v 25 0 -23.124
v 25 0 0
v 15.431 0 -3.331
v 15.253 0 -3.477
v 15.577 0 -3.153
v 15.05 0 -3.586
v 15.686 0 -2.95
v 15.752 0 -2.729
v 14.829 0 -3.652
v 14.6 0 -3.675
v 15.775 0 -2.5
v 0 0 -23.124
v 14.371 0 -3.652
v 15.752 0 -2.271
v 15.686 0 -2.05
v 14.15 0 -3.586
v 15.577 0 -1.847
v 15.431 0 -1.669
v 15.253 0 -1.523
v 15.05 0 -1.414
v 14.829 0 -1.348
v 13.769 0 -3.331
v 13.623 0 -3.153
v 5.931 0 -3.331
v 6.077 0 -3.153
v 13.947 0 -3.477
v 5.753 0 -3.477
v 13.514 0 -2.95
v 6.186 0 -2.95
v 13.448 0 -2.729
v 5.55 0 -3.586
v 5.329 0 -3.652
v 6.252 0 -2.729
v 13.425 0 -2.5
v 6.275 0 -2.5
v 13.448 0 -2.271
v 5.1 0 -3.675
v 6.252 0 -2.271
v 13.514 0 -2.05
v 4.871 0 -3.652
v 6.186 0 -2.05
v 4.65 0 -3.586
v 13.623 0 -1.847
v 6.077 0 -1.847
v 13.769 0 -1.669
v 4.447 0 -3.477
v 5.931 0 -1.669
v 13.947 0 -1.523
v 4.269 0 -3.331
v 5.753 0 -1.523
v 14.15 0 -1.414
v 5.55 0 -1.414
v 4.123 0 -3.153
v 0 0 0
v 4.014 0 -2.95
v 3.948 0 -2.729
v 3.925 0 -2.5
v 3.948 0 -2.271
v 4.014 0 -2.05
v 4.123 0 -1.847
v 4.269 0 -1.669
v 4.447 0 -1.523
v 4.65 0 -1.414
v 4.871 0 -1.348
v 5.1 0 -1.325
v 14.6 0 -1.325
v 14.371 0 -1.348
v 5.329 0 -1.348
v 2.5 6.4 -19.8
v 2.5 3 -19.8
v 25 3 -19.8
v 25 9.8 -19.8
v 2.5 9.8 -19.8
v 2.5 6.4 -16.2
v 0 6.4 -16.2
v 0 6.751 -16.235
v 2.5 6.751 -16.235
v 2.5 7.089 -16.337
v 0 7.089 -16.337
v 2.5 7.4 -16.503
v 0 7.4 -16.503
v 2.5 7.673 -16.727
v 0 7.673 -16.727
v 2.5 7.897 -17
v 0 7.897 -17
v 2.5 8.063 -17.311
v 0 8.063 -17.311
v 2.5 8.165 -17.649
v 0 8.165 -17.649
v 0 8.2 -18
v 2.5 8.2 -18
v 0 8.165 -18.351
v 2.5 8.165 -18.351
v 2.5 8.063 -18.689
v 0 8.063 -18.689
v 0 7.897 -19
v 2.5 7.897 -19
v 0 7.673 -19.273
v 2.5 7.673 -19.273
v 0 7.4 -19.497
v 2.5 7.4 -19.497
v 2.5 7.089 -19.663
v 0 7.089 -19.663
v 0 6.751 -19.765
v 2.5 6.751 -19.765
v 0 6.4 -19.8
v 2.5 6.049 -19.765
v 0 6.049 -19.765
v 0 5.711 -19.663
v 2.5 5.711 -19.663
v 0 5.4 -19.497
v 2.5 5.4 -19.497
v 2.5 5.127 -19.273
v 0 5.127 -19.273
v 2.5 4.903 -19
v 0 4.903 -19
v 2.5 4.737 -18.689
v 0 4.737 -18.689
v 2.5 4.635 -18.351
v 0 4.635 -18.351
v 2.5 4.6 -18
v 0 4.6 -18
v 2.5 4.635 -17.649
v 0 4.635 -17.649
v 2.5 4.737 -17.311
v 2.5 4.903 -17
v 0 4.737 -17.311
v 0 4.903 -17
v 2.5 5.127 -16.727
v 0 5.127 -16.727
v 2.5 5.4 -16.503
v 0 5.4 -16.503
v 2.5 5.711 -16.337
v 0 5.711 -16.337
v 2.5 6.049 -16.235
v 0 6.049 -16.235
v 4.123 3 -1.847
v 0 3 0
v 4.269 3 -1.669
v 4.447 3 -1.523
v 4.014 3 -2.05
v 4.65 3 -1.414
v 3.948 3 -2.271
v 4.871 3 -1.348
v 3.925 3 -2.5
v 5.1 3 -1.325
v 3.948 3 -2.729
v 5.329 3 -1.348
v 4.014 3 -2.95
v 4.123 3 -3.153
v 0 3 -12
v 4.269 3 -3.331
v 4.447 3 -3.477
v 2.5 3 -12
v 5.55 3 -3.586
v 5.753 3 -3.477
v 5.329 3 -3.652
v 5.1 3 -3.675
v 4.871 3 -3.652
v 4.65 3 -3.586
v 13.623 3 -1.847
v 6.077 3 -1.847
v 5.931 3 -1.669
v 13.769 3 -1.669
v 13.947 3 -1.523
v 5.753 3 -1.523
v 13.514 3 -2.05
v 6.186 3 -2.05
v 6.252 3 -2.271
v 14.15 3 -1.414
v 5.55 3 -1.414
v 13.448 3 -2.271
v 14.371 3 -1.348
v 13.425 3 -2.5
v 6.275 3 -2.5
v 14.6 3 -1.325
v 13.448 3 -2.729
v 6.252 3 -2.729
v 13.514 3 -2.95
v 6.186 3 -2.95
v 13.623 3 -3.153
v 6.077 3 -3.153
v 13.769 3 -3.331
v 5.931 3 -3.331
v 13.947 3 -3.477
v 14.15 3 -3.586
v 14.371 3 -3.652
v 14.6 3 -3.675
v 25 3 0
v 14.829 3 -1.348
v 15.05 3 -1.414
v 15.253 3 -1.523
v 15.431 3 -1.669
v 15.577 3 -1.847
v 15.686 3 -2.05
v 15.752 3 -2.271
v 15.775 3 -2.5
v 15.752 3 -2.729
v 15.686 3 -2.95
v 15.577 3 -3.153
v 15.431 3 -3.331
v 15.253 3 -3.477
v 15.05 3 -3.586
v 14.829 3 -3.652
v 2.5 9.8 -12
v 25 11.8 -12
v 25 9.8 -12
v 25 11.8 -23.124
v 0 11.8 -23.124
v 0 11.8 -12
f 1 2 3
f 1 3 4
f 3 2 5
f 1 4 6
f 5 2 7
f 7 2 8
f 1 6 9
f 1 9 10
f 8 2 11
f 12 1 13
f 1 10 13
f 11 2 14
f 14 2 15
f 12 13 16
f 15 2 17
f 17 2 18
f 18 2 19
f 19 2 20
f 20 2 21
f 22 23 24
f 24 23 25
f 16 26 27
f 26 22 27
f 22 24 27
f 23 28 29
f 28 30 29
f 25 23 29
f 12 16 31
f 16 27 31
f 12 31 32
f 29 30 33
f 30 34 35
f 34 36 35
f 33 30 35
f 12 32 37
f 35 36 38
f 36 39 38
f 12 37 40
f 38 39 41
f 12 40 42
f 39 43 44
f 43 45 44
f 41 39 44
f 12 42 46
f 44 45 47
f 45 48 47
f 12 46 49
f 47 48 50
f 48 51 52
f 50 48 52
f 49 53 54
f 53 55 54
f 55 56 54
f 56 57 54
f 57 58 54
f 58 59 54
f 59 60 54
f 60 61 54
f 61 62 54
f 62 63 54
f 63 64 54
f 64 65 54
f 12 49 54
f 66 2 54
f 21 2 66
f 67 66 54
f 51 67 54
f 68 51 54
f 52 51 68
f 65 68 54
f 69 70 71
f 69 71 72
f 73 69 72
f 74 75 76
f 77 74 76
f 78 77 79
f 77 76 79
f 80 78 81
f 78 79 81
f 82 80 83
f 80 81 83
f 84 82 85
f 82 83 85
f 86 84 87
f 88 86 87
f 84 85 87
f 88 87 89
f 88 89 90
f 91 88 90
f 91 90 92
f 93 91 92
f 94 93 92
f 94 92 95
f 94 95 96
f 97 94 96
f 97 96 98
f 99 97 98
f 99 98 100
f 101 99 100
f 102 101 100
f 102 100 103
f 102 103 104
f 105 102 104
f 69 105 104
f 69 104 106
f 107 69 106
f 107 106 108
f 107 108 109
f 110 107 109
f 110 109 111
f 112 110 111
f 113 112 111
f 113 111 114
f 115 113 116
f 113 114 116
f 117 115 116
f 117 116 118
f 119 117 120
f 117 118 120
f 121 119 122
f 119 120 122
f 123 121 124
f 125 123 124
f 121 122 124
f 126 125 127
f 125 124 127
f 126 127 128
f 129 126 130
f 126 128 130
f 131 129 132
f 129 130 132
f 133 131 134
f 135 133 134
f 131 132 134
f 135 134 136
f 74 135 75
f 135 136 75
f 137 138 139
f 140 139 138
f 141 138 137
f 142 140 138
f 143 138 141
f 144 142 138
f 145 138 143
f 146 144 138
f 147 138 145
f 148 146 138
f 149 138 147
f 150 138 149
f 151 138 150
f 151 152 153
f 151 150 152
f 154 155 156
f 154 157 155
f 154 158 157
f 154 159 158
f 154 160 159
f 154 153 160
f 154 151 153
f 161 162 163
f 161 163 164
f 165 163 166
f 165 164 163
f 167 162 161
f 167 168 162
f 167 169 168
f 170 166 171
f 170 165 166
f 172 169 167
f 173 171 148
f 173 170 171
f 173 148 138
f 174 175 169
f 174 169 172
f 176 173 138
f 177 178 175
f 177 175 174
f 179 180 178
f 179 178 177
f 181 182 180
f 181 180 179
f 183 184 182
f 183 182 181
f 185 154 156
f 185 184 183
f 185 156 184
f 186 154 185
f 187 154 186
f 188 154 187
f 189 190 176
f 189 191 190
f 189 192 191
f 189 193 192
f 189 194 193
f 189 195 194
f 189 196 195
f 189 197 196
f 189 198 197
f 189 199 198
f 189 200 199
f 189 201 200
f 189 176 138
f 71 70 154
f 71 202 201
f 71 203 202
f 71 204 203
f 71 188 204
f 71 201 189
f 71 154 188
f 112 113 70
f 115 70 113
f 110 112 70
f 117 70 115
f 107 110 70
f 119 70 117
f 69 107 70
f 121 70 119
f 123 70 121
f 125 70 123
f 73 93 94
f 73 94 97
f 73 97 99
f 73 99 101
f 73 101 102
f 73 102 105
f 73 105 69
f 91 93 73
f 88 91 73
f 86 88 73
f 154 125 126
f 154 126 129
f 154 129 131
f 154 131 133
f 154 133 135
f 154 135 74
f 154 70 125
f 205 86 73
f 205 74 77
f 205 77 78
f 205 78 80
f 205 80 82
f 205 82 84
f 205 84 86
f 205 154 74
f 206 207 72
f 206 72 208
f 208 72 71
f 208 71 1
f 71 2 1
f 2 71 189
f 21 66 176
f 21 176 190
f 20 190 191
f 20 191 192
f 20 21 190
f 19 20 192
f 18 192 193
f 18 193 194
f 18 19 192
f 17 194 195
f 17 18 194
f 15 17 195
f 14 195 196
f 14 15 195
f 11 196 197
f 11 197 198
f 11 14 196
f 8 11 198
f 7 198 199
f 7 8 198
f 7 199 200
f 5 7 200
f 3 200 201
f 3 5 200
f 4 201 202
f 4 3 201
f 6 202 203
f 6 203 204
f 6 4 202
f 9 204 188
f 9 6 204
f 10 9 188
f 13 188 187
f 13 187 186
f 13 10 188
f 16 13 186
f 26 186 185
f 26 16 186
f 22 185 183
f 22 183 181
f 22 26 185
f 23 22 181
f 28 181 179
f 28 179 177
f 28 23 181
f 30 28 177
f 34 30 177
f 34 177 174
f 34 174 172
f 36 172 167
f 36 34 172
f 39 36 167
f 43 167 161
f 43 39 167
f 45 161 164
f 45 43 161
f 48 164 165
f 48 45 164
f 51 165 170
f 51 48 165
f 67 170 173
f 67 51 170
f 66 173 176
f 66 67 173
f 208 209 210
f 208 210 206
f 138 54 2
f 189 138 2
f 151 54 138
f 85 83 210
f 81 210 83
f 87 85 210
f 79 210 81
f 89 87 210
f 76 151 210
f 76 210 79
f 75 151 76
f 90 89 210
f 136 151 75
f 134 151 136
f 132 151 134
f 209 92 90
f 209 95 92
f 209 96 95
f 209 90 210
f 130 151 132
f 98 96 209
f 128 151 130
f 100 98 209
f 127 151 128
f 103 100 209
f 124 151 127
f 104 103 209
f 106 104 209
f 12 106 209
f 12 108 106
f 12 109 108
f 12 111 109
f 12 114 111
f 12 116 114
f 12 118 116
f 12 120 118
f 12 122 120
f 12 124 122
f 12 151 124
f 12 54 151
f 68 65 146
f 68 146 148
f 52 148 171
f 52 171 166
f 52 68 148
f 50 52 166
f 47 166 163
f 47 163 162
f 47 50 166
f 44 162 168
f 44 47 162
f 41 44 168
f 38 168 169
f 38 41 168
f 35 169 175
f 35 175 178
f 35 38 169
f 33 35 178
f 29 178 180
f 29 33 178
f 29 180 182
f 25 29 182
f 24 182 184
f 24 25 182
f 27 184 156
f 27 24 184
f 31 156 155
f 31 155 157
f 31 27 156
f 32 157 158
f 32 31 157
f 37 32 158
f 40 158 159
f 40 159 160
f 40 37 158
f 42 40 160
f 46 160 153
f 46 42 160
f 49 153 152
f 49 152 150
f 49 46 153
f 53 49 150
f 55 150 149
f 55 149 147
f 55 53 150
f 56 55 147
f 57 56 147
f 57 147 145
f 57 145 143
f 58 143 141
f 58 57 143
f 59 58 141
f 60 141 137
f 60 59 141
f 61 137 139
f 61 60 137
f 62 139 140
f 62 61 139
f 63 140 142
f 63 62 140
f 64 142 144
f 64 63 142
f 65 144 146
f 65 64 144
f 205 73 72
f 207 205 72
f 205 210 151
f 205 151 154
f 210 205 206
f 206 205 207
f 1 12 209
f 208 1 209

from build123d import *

# Parameters (mm, degrees)
SKETCH1_W           = 25
SKETCH1_H           = 20
SKETCH1_R           = 1.175
BOSS_EXTRUDE2_DEPTH = 3
SKETCH3_W           = 2.5
SKETCH3_H           = 8
BOSS_EXTRUDE3_DEPTH = 6.8
SKETCH5_W           = 2.5
SKETCH5_H           = 6.8
BOSS_EXTRUDE5_DEPTH = 6.8
SKETCH7_R           = 1.8
CUT_EXTRUDE1_DEPTH  = 6.8
SKETCH8_W           = 7
SKETCH8_H           = 6.8
BOSS_EXTRUDE6_DEPTH = 22.5
SKETCH9_W           = 25
SKETCH9_H           = 14.8
BOSS_EXTRUDE7_DEPTH = 2
SKETCH10_W          = 3.676013555
SKETCH10_H          = 11.8
CUT_EXTRUDE2_DEPTH  = 36


with BuildPart() as part:
    # Sketch1 → Boss-Extrude2 (new body)
    with BuildSketch(Plane(origin=(0, 0, 0), x_dir=(1, 0, 0), z_dir=(0, 1, 0))):
        with Locations((12.5, 10)):
            Rectangle(SKETCH1_W, SKETCH1_H)
        with Locations(Location((5.1, 2.5, 0), (0, 0, 270))):
            Circle(SKETCH1_R, mode=Mode.SUBTRACT)
        with Locations(Location((14.6, 2.5, 0), (0, 0, 270))):
            Circle(SKETCH1_R, mode=Mode.SUBTRACT)
    extrude(amount=BOSS_EXTRUDE2_DEPTH)

    # Sketch3 → Boss-Extrude3 (add)
    with BuildSketch(Plane(origin=(0, 3, 0), x_dir=(1, 0, 0), z_dir=(0, 1, 0))):
        with Locations((1.25, 16)):
            Rectangle(SKETCH3_W, SKETCH3_H)
    extrude(amount=BOSS_EXTRUDE3_DEPTH)

    # Sketch5 → Boss-Extrude5 (add)
    with BuildSketch(Plane(origin=(0, 0, -20), x_dir=(-1, 0, 0), z_dir=(0, 0, -1))):
        Polygon((0, 0), (0, 3), (-2.5, 3), (-25, 3), (-25, 0), align=None)
        with Locations((-1.25, 6.4)):
            Rectangle(SKETCH5_W, SKETCH5_H)
    extrude(amount=BOSS_EXTRUDE5_DEPTH)

    # Sketch7 → Cut-Extrude1 (cut)
    with BuildSketch(Plane.ZY):
        with Locations((-18, 6.4)):
            Circle(SKETCH7_R)
    extrude(amount=-CUT_EXTRUDE1_DEPTH, mode=Mode.SUBTRACT)

    # Sketch8 → Boss-Extrude6 (add)
    with BuildSketch(Plane(origin=(2.5, 0, 0), x_dir=(0, 0, -1), z_dir=(1, 0, 0))):
        with Locations((23.3, 6.4)):
            Rectangle(SKETCH8_W, SKETCH8_H)
    extrude(amount=BOSS_EXTRUDE6_DEPTH)

    # Sketch9 → Boss-Extrude7 (add)
    with BuildSketch(Plane(origin=(0, 9.8, 0), x_dir=(1, 0, 0), z_dir=(0, 1, 0))):
        with Locations((12.5, 19.4)):
            Rectangle(SKETCH9_W, SKETCH9_H)
    extrude(amount=BOSS_EXTRUDE7_DEPTH)

    # Sketch10 → Cut-Extrude2 (cut)
    with BuildSketch(Plane(origin=(25, 0, 0), x_dir=(0, 0, -1), z_dir=(1, 0, 0))):
        with Locations((24.961993222, 5.9)):
            Rectangle(SKETCH10_W, SKETCH10_H)
    extrude(amount=-CUT_EXTRUDE2_DEPTH, mode=Mode.SUBTRACT)


solid = part.part
